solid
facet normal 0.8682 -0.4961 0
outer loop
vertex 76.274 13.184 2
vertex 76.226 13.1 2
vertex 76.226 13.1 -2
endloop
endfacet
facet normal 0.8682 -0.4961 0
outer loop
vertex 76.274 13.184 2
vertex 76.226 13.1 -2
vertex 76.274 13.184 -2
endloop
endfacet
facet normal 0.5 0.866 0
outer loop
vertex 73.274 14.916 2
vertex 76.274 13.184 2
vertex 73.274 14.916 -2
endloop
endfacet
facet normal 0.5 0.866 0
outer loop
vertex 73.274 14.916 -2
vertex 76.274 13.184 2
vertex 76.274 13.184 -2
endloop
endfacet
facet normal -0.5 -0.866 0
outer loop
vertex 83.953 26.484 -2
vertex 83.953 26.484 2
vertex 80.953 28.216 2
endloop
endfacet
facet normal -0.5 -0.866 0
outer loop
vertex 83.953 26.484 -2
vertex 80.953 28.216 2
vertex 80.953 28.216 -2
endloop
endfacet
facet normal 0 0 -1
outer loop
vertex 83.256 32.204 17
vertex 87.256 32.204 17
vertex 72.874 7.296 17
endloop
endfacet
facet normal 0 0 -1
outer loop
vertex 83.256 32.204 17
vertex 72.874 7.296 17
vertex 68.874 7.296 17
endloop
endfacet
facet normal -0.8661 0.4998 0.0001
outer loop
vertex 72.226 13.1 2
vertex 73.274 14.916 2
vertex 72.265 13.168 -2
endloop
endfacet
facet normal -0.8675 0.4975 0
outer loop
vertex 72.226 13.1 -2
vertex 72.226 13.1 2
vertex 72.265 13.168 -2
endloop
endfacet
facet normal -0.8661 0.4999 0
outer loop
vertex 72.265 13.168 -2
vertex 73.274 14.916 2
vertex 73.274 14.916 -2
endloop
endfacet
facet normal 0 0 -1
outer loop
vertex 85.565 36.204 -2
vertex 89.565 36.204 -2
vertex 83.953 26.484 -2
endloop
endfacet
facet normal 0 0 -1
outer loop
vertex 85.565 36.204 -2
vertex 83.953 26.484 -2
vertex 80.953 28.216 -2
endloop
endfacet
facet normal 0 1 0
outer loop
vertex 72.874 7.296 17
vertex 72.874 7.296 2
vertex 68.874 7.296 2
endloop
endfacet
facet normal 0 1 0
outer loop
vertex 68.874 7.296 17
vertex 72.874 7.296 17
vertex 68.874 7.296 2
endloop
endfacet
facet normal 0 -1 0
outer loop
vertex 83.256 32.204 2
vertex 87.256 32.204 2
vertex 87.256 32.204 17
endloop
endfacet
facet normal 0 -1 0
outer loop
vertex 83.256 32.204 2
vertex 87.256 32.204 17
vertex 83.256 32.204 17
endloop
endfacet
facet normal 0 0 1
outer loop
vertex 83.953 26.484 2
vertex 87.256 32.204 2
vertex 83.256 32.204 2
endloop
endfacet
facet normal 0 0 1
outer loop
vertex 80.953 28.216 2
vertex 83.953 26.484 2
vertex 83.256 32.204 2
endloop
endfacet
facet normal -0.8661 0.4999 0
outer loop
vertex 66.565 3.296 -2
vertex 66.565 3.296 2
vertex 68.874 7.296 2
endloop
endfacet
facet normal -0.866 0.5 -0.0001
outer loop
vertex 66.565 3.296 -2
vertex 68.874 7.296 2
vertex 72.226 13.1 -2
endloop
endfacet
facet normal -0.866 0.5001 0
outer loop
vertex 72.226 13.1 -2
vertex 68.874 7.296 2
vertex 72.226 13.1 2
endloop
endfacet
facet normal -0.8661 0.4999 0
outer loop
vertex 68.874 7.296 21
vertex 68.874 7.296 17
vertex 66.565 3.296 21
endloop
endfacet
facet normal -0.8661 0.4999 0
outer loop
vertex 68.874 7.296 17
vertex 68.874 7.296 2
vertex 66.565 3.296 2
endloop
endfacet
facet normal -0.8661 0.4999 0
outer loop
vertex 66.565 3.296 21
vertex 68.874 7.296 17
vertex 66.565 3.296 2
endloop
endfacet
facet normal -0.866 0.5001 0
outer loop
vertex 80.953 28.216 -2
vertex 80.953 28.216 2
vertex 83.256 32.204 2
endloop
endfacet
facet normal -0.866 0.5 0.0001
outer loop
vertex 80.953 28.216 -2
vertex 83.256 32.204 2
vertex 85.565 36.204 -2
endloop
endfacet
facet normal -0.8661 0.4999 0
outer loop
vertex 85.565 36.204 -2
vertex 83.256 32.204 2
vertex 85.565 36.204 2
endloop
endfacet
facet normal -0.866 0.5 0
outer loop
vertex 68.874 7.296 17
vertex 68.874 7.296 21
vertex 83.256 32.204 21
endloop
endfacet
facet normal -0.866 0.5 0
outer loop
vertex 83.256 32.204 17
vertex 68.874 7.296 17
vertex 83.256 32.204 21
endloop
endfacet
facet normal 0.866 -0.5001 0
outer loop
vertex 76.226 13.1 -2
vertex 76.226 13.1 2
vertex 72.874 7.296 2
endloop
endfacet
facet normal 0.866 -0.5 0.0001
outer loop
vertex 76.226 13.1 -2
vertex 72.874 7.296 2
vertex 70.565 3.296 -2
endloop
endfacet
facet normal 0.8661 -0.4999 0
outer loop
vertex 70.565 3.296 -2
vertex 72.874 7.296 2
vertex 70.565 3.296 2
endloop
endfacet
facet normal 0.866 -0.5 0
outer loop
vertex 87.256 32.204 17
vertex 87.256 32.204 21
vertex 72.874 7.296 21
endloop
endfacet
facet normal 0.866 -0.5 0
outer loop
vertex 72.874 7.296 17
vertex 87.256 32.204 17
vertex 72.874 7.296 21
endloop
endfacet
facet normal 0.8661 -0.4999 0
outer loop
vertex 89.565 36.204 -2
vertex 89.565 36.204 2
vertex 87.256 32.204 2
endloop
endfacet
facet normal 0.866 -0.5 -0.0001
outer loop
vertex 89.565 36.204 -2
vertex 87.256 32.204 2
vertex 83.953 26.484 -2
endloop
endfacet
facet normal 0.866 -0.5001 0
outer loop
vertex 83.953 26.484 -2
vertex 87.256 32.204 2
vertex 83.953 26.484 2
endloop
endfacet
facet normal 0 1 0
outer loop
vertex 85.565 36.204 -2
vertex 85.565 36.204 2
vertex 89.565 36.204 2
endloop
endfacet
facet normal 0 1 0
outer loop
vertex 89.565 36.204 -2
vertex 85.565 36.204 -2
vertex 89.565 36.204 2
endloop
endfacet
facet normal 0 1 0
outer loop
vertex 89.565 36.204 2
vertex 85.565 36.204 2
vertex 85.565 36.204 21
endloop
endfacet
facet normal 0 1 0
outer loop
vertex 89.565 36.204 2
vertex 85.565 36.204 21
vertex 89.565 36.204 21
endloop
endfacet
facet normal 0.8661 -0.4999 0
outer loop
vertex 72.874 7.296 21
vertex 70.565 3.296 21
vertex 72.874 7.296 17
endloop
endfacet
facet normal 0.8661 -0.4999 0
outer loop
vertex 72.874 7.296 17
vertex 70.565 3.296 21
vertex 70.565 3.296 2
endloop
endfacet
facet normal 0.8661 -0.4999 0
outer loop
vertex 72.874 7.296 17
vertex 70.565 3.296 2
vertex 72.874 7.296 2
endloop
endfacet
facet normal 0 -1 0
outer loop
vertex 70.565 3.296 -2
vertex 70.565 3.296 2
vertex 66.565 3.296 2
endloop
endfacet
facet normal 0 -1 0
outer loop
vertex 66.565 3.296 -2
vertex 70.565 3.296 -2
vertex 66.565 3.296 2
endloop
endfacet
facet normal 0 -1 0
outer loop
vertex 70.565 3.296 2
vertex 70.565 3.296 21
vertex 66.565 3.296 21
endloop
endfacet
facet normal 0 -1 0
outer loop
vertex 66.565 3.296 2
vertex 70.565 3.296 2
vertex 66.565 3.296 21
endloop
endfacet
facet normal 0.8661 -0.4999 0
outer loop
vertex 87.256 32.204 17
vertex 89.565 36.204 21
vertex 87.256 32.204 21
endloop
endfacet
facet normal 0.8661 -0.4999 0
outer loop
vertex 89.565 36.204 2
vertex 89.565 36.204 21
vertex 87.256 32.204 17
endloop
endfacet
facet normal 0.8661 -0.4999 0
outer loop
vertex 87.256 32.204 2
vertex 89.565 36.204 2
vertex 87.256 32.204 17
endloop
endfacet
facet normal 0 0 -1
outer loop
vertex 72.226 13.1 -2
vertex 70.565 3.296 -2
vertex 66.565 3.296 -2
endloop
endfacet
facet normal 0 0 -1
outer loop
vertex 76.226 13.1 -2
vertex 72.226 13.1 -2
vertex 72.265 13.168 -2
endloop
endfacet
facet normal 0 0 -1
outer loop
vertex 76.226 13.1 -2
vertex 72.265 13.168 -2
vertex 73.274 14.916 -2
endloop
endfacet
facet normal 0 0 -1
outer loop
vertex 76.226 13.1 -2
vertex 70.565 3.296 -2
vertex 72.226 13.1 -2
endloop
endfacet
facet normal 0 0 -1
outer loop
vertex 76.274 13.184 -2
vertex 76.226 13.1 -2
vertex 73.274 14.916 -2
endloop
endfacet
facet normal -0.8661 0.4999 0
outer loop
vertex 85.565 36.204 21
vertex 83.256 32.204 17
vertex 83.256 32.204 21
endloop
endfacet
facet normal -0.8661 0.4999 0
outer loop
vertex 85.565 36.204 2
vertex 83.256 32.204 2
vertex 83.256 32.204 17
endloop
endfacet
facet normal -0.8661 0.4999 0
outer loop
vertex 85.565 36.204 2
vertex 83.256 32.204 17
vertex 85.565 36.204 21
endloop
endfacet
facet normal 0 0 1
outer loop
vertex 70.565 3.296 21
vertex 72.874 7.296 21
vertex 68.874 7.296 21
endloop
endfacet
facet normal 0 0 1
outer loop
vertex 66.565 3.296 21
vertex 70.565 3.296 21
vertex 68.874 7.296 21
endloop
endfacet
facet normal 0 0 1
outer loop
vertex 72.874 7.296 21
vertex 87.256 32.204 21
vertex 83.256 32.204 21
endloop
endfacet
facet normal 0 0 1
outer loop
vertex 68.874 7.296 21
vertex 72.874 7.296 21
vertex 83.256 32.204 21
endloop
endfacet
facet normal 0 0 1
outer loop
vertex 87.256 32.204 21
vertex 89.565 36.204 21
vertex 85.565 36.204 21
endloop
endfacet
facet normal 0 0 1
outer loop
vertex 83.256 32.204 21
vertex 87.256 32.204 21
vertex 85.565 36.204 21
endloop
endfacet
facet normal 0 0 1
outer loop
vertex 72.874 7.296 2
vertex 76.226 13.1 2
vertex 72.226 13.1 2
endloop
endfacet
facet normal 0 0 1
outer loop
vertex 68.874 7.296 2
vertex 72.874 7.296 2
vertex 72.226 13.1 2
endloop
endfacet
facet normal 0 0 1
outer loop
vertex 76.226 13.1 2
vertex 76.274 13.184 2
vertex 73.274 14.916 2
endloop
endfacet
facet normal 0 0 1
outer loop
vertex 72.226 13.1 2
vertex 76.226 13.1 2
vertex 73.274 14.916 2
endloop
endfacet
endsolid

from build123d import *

# Parameters (mm, degrees)
SKETCH1_R           = 5
SKETCH1_R_2         = 3
BOSS_EXTRUDE1_DEPTH = 7
SKETCH2_R           = 3
BOSS_EXTRUDE2_DEPTH = 7
SKETCH3_W           = 16.288395929
SKETCH3_H           = 13.1
BOSS_EXTRUDE3_DEPTH = 4
SKETCH4_W           = 4.517614974
SKETCH4_H           = 7
CUT_EXTRUDE1_DEPTH  = 4
BOSS_EXTRUDE4_DEPTH = 4
BOSS_EXTRUDE5_DEPTH = 4
BOSS_EXTRUDE6_DEPTH = 19
BOSS_EXTRUDE7_DEPTH = 4
BOSS_EXTRUDE8_DEPTH = 8.1
SKETCH10_W          = 12.1
SKETCH10_H          = 15.357517161
CUT_EXTRUDE2_DEPTH  = 90.333377092
CUT_EXTRUDE3_DEPTH  = 87.16880235
SKETCH12_W          = 10.311784895
SKETCH12_H          = 4.86074743
CUT_EXTRUDE4_DEPTH  = 10


with BuildPart() as part:
    # Sketch1 → Boss-Extrude1 (new body)
    with BuildSketch(Plane(origin=(0, 0, 0), x_dir=(1, 0, 0), z_dir=(0, 1, 0))):
        with Locations(Location((0, 0, 0), (0, 0, 270))):
            Circle(SKETCH1_R)
        with Locations(Location((0, 0, 0), (0, 0, 270))):
            Circle(SKETCH1_R_2, mode=Mode.SUBTRACT)
    extrude(amount=BOSS_EXTRUDE1_DEPTH)

    # Sketch2 → Boss-Extrude2 (add, through all)
    with BuildSketch(Plane(origin=(0, 7, 0), x_dir=(1, 0, 0), z_dir=(0, 1, 0))):
        with BuildLine():
            Line((4.582575695, -2), (34.582575695, -2))
            Line((34.582575695, -2), (34.582575695, 2))
            Line((34.582575695, 2), (4.582575695, 2))
            ThreePointArc((4.582575695, 2), (-5, 0), (4.582575695, -2))
        make_face()
        with Locations(Location((0, 0, 0), (0, 0, 270))):
            Circle(SKETCH2_R, mode=Mode.SUBTRACT)
    extrude(amount=-BOSS_EXTRUDE2_DEPTH)

    # Sketch3 → Boss-Extrude3 (add)
    with BuildSketch(Plane.XY.offset(2)):
        with Locations((21.920762757, 6.55)):
            Rectangle(SKETCH3_W, SKETCH3_H)
    extrude(amount=-BOSS_EXTRUDE3_DEPTH)

    # Sketch4 → Cut-Extrude1 (cut)
    with BuildSketch(Plane.XY.offset(2)):
        with Locations((32.323768208, 3.5)):
            Rectangle(SKETCH4_W, SKETCH4_H)
    extrude(amount=-CUT_EXTRUDE1_DEPTH, mode=Mode.SUBTRACT)

    # Sketch5 → Boss-Extrude4 (add)
    with BuildSketch(Plane.XY.offset(2)):
        Polygon((30.064960721, 13.1), (30.064960721, 0), (36.964960721, 0), (50.064960721, 13.1), (76.225581431, 13.1), (80.064960721, 19.75), (80.064960721, 26.4), (43.364960721, 26.4), align=None)
    extrude(amount=-BOSS_EXTRUDE4_DEPTH)

    # Sketch6 → Boss-Extrude5 (add)
    with BuildSketch(Plane.XY.offset(2)):
        Polygon((64.244452646, 36.204482672), (68.244452646, 36.204482672), (49.244452646, 3.295517328), (45.244452646, 3.295517328), align=None)
        Polygon((85.564960721, 36.204482672), (89.564960721, 36.204482672), (70.564960721, 3.295517328), (66.564960721, 3.295517328), align=None)
    extrude(amount=-BOSS_EXTRUDE5_DEPTH)

    # Sketch7 → Boss-Extrude6 (add)
    with BuildSketch(Plane.XY.offset(2)):
        Polygon((68.244452646, 36.204482672), (64.244452646, 36.204482672), (61.935051569, 32.204482672), (65.935051569, 32.204482672), align=None)
        Polygon((85.564960721, 36.204482672), (89.564960721, 36.204482672), (87.255559645, 32.204482672), (83.255559645, 32.204482672), align=None)
        Polygon((66.564960721, 3.295517328), (70.564960721, 3.295517328), (72.874361798, 7.295517328), (68.874361798, 7.295517328), align=None)
        Polygon((45.244452646, 3.295517328), (49.244452646, 3.295517328), (51.553853723, 7.295517328), (47.553853723, 7.295517328), align=None)
    extrude(amount=BOSS_EXTRUDE6_DEPTH)

    # Sketch8 → Boss-Extrude7 (add)
    with BuildSketch(Plane.XY.offset(21)):
        Polygon((64.244452646, 36.204482672), (68.244452646, 36.204482672), (49.244452646, 3.295517328), (45.244452646, 3.295517328), align=None)
        Polygon((85.564960721, 36.204482672), (89.564960721, 36.204482672), (70.564960721, 3.295517328), (66.564960721, 3.295517328), align=None)
    extrude(amount=-BOSS_EXTRUDE7_DEPTH)

    # Sketch9 → Boss-Extrude8 (add)
    with BuildSketch(Plane(origin=(0, 0, -2), x_dir=(-1, 0, 0), z_dir=(0, 0, -1))):
        Polygon((-54.905073356, 13.1), (-62.583831936, 26.4), (-83.95273694, 26.483825938), (-76.273978359, 13.183825938), align=None)
    extrude(amount=BOSS_EXTRUDE8_DEPTH)

    # Sketch10 → Cut-Extrude2 (cut, through all)
    with BuildSketch(Plane(origin=(51.496719679, -29.731644969, 0), x_dir=(0, 0, -1), z_dir=(0.8660254037844388, -0.49999999999999983, 0))):
        with Locations((4.05, 57.233275941)):
            Rectangle(SKETCH10_W, SKETCH10_H)
    extrude(amount=-CUT_EXTRUDE2_DEPTH, mode=Mode.SUBTRACT)

    # Sketch11 → Cut-Extrude3 (cut, through all)
    with BuildSketch(Plane(origin=(48.496719679, -27.999594161, 0), x_dir=(0, 0, 1), z_dir=(-0.8660254037844388, 0.49999999999999983, 0))):
        Polygon((-20.134561074, 86.736839969), (39.285177729, 86.736839969), (39.285177729, 23.813896611), (39.285177729, -9.631836795), (-20.134561074, -9.631836795), (-20.134561074, 23.813896611), align=None)
    extrude(amount=CUT_EXTRUDE3_DEPTH, mode=Mode.SUBTRACT)

    # Sketch12 → Cut-Extrude4 (cut)
    with BuildSketch(Plane(origin=(51.496719679, -29.731644969, 0), x_dir=(0, 0, -1), z_dir=(0.8660254037844388, -0.49999999999999983, 0))):
        with Locations((7.155892448, 47.124143646)):
            Rectangle(SKETCH12_W, SKETCH12_H)
    extrude(amount=-CUT_EXTRUDE4_DEPTH, mode=Mode.SUBTRACT)


solid = part.part
